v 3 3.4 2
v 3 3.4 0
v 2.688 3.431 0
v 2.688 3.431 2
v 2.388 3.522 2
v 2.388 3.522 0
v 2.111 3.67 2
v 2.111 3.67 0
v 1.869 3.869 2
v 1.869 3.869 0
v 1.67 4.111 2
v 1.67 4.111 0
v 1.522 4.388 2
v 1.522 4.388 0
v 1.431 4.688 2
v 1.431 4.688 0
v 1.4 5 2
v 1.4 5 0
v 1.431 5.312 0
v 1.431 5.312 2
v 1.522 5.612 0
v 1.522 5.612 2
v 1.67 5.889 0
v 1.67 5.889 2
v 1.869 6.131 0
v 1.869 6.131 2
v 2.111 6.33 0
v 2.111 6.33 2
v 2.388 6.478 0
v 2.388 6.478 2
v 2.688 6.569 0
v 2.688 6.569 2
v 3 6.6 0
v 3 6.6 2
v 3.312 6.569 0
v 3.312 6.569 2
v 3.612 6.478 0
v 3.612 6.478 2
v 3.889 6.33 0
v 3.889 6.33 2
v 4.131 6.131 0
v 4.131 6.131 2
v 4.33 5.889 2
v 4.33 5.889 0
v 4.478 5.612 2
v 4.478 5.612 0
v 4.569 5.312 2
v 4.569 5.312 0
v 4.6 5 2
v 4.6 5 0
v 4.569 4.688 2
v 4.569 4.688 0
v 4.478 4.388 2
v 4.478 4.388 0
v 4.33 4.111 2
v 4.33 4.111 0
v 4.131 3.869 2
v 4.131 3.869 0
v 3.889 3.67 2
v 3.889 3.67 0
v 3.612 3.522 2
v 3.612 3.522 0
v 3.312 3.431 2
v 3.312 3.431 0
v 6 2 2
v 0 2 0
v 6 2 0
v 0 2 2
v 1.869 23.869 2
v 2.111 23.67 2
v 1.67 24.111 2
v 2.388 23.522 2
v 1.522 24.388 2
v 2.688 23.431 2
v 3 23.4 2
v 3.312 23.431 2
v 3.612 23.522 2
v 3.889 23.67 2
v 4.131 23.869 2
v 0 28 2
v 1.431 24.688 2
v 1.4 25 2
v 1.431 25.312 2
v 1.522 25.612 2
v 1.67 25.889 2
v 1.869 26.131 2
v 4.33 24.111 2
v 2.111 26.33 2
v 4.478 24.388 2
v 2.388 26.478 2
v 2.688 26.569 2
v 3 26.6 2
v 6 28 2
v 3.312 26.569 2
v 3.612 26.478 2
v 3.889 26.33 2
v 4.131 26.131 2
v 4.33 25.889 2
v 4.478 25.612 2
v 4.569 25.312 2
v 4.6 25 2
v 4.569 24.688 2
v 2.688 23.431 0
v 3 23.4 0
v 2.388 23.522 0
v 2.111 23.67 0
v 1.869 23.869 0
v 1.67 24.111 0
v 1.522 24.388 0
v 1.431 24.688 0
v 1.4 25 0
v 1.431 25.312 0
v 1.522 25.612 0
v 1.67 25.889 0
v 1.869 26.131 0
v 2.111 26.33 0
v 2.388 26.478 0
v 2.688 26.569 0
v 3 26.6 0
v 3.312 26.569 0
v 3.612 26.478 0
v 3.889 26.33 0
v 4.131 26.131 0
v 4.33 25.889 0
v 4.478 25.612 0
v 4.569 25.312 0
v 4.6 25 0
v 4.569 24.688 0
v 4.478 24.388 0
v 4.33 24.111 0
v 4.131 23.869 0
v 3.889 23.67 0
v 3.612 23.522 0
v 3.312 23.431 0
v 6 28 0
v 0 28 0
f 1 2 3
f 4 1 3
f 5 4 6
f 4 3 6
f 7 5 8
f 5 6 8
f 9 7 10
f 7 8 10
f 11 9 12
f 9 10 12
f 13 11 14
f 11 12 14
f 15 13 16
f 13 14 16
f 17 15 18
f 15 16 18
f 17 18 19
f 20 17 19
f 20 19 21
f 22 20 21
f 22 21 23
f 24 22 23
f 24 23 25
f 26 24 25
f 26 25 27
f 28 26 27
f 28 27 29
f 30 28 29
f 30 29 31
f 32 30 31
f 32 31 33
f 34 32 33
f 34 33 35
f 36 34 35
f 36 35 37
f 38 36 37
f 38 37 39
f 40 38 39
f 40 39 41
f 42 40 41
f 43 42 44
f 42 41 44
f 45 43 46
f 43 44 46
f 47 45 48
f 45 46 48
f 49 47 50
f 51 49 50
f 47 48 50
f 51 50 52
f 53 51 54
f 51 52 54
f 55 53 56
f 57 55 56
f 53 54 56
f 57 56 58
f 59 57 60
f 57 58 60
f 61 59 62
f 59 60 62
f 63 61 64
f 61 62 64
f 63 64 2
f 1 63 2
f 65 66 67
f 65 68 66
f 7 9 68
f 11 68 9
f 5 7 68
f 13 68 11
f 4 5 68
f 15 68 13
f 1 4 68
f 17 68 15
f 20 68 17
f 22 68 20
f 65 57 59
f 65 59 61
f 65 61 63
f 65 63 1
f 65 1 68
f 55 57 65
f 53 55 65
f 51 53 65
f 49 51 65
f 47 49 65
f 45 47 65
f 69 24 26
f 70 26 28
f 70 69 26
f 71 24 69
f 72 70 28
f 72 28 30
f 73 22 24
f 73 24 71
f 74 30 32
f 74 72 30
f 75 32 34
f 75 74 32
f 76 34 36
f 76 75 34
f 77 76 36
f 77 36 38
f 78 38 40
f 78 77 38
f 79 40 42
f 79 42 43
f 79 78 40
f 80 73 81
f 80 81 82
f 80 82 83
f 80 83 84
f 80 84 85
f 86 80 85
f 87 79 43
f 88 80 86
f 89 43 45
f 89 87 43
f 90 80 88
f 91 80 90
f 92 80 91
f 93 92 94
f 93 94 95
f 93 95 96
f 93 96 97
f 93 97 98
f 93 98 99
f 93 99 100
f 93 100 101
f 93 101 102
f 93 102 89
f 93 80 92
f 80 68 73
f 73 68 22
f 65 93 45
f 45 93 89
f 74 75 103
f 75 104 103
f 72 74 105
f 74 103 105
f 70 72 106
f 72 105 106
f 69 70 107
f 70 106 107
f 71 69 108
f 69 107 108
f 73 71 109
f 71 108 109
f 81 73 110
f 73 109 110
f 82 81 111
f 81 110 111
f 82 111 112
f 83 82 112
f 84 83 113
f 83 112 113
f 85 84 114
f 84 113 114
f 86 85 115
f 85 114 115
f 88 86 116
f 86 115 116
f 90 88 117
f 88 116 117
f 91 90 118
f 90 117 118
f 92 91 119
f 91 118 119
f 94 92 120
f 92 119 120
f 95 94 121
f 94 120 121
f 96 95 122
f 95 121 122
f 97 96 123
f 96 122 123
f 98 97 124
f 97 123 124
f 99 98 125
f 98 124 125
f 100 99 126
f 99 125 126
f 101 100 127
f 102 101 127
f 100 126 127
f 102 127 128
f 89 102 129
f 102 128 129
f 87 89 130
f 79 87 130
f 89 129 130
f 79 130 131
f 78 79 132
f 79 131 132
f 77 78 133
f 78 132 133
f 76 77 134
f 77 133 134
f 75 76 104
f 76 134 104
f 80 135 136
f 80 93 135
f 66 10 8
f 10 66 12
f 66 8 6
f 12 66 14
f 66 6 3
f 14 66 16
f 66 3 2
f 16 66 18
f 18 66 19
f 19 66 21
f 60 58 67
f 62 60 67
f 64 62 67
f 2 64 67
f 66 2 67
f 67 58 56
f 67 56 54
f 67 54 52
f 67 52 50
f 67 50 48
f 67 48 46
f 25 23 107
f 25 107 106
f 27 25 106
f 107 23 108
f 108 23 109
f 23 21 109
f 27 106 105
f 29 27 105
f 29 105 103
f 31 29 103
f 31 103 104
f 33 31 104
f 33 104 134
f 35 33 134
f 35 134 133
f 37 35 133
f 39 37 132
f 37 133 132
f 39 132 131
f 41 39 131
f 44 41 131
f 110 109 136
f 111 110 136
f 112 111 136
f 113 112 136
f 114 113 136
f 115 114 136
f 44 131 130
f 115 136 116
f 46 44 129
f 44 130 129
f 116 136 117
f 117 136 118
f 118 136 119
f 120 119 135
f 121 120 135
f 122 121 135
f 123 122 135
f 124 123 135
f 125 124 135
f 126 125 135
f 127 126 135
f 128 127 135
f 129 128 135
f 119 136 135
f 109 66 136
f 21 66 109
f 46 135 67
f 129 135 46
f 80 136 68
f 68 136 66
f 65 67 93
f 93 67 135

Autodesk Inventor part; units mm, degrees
ref_plane "YZ Plane" through (0, 0, 0) normal (1, 0, 0) x (0, 1, 0)
ref_plane "XZ Plane" through (0, 0, 0) normal (0, 1, 0) x (-1, 0, 0)
ref_plane "XY Plane" through (0, 0, 0) normal (0, 0, 1) x (1, 0, 0)
sketch "スケッチ1" plane through (0, 0, 0) normal (0, 0, 1) x (1, 0, 0)
  line L0 (0, 0) -> (6, 0)
  line L1 (6, 0) -> (6, 30)
  line L2 (6, 30) -> (0, 30)
  line L3 (0, 30) -> (0, 0)
  dimension "d0" = 6
  dimension "d1" = 30
extrude "押し出し1" add sketch "スケッチ1" along normal blind 2
sketch "スケッチ2" plane through (0, 0, 2) normal (0, 0, 1) x (1, 0, 0)
  line L0 (6, 30) -> (0, 30) projected
  line L1 (6, 0) -> (6, 30) projected
  line L2 (0, 0) -> (6, 0) projected
  point P0 (3, 25)
  point P1 (3, 5)
  dimension "d4" = 5
  dimension "d5" = 3
  dimension "d6" = 3
  dimension "d7" = 5
hole "穴1" at (3, 25, 2) at (3, 5, 2) direction (0, 0, -1) diameter 3.2 end through all
sketch "スケッチ4" plane through (0, 0, 2) normal (0, 0, 1) x (1, 0, 0)
  line L0 (6, 30) -> (0, 30) projected
  line L1 (6, 0) -> (6, 30) projected
  line L2 (0, 30) -> (6, 30)
  line L3 (6, 30) -> (6, 28)
  line L4 (6, 28) -> (0, 28)
  line L5 (0, 28) -> (0, 30)
  line L6 (0, 30) -> (0, 0) projected
  line L7 (0, 2) -> (6, 2)
  line L8 (6, 2) -> (6, 0)
  line L9 (6, 0) -> (0, 0)
  line L10 (0, 0) -> (0, 2)
  dimension "d18" = 2
  dimension "d19" = 2
extrude "押し出し2" cut sketch "スケッチ4" against normal blind 10 contours L1 L4 L5 L0 | L1 L9 L6 L7
properties part number "リンク30×6×2"
